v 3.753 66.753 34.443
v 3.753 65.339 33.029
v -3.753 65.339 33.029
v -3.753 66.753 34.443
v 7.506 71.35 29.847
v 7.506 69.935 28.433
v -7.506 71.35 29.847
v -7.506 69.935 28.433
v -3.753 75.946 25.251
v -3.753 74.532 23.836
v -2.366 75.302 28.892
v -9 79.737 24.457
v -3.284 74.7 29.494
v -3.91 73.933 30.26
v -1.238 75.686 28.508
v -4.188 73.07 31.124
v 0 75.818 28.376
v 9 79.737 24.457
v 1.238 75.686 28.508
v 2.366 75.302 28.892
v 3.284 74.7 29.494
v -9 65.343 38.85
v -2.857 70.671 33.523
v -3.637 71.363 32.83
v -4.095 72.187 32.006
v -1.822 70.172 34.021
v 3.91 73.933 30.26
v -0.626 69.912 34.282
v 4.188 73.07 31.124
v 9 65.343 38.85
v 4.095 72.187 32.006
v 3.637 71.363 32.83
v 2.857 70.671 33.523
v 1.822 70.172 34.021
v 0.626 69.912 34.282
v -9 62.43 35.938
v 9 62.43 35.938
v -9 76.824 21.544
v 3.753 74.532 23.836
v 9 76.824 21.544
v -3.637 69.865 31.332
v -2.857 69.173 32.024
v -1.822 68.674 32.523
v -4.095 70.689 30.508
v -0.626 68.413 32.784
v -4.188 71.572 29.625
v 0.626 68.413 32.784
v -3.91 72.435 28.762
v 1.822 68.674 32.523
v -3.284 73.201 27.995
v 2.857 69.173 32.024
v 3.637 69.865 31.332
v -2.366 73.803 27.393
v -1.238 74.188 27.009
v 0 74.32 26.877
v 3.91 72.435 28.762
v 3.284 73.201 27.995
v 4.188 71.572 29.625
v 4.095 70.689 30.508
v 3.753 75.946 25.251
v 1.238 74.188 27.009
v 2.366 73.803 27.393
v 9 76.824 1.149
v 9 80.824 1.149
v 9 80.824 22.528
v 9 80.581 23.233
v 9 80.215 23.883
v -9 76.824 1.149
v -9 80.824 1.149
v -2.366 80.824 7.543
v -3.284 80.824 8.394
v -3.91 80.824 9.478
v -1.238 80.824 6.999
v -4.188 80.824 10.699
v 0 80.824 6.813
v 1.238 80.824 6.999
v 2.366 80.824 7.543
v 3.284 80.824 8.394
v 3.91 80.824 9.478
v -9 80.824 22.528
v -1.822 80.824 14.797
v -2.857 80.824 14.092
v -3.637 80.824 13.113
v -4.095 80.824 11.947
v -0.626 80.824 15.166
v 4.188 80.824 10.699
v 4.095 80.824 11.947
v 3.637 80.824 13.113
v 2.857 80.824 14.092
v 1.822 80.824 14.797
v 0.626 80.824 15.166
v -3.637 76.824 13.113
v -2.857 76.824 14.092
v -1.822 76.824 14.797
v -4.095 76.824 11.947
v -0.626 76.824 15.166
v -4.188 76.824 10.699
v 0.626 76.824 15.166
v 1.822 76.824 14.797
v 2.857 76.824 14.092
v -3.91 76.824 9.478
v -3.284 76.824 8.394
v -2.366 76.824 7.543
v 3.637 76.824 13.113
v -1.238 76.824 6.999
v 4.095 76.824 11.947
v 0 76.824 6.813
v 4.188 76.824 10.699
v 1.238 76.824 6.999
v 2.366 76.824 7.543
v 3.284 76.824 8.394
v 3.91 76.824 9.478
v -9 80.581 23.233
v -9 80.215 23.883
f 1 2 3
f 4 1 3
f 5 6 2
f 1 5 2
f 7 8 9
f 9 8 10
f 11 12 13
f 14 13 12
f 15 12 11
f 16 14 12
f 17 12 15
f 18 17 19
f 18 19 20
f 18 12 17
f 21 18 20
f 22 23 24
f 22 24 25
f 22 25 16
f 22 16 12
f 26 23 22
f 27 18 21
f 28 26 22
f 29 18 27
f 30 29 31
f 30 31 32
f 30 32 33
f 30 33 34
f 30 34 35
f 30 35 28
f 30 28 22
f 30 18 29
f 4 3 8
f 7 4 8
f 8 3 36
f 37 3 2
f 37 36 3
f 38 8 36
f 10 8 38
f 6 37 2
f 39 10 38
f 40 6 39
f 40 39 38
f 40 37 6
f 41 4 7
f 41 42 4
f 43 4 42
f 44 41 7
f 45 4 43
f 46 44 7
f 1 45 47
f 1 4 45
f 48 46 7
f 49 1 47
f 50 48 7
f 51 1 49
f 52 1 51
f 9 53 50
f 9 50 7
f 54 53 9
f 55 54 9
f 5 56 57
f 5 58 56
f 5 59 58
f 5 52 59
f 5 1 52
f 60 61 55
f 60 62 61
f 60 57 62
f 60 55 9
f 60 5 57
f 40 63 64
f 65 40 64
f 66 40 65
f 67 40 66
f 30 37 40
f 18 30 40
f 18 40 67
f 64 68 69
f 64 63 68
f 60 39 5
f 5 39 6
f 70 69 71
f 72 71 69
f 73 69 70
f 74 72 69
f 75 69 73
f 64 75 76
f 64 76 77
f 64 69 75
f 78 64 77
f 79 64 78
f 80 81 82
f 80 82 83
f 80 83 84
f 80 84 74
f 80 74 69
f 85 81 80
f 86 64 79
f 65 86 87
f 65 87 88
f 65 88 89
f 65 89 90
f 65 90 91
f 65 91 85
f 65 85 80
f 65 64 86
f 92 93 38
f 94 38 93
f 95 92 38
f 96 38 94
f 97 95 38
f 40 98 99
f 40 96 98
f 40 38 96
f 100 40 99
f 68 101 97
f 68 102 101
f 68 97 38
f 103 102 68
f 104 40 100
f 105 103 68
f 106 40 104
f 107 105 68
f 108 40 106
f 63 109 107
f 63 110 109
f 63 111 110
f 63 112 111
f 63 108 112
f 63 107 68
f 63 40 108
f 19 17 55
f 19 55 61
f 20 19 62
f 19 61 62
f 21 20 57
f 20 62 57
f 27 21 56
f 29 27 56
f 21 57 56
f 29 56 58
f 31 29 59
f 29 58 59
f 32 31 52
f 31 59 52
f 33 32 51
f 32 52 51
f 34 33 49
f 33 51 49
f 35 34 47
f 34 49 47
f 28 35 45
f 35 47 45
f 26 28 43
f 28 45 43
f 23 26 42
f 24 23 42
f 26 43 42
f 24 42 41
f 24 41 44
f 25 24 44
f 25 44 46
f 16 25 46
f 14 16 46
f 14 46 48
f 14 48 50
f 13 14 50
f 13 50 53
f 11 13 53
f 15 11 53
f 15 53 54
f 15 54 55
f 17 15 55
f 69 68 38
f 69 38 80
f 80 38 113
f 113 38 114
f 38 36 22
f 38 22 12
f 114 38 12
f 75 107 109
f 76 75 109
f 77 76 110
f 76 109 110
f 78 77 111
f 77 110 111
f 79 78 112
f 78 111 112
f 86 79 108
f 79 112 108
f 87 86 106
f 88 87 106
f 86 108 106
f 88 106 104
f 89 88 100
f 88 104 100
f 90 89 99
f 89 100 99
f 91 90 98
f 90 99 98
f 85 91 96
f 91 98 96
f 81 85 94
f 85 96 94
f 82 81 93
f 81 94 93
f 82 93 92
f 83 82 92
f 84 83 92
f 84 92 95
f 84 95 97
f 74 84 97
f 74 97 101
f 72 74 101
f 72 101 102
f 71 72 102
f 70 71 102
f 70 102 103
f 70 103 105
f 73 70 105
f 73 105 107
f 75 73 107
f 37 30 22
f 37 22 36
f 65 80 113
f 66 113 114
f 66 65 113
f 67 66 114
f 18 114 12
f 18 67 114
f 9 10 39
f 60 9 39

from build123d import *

# Parameters (mm, degrees)
PAD014_DEPTH    = 9
SKETCH027_R     = 4.2
POCKET006_DEPTH = 5
SKETCH029_R     = 4.2
POCKET007_DEPTH = 5
POCKET008_DEPTH = 2


with BuildPart() as part:
    # Sketch026 → Pad014 (new body, symmetric)
    with BuildSketch(Plane.YZ):
        with BuildLine():
            Line((76.8243574995, 1.148527), (80.8243574995, 1.148527))
            Line((80.8243574995, 1.148527), (80.8243574995, 22.527915258))
            ThreePointArc((80.8243574995, 22.527915258), (80.4127450289, 23.566637908), (79.7371364968, 24.4565382849))
            Line((79.7371364968, 24.4565382849), (65.343272443, 38.8504023386))
            Line((65.343272443, 38.8504023386), (62.4304934457, 35.9376233413))
            Line((62.4304934457, 35.9376233413), (76.8243574995, 21.5437592876))
            Line((76.8243574995, 21.5437592876), (76.8243574995, 1.148527))
        make_face()
    extrude(amount=PAD014_DEPTH, both=True)

    # Sketch027 (on Face7 of Pad014) → Pocket006 (cut)
    with BuildSketch(Plane(origin=(0, 76.8243574995, 0), x_dir=(0, 0, -1), z_dir=(0, -1, 0))):
        with Locations((-11.01278, 0)):
            Circle(SKETCH027_R)
    extrude(amount=-POCKET006_DEPTH, mode=Mode.SUBTRACT)

    # Sketch029 (on Face6 of Pocket006) → Pocket007 (cut)
    with BuildSketch(Plane(origin=(0, 49.1840583935, 49.1840583935), x_dir=(0, 0.7071067812, -0.7071067812), z_dir=(0, -0.7071067812, -0.7071067812))):
        with Locations((29.346884, 0)):
            Circle(SKETCH029_R)
    extrude(amount=-POCKET007_DEPTH, mode=Mode.SUBTRACT)

    # Sketch030 (on Face6 of Pocket007) → Pocket008 (cut)
    with BuildSketch(Plane(origin=(0, 49.1840583935, 49.1840583935), x_dir=(0, 0.7071067812, -0.7071067812), z_dir=(0, -0.7071067812, -0.7071067812))):
        Polygon((22.846884, 3.7527767497), (22.846884, -3.7527767497), (29.346884, -7.5055534995), (35.846884, -3.7527767497), (35.846884, 3.7527767497), (29.346884, 7.5055534995), align=None)
    extrude(amount=-POCKET008_DEPTH, mode=Mode.SUBTRACT)


solid = part.part
